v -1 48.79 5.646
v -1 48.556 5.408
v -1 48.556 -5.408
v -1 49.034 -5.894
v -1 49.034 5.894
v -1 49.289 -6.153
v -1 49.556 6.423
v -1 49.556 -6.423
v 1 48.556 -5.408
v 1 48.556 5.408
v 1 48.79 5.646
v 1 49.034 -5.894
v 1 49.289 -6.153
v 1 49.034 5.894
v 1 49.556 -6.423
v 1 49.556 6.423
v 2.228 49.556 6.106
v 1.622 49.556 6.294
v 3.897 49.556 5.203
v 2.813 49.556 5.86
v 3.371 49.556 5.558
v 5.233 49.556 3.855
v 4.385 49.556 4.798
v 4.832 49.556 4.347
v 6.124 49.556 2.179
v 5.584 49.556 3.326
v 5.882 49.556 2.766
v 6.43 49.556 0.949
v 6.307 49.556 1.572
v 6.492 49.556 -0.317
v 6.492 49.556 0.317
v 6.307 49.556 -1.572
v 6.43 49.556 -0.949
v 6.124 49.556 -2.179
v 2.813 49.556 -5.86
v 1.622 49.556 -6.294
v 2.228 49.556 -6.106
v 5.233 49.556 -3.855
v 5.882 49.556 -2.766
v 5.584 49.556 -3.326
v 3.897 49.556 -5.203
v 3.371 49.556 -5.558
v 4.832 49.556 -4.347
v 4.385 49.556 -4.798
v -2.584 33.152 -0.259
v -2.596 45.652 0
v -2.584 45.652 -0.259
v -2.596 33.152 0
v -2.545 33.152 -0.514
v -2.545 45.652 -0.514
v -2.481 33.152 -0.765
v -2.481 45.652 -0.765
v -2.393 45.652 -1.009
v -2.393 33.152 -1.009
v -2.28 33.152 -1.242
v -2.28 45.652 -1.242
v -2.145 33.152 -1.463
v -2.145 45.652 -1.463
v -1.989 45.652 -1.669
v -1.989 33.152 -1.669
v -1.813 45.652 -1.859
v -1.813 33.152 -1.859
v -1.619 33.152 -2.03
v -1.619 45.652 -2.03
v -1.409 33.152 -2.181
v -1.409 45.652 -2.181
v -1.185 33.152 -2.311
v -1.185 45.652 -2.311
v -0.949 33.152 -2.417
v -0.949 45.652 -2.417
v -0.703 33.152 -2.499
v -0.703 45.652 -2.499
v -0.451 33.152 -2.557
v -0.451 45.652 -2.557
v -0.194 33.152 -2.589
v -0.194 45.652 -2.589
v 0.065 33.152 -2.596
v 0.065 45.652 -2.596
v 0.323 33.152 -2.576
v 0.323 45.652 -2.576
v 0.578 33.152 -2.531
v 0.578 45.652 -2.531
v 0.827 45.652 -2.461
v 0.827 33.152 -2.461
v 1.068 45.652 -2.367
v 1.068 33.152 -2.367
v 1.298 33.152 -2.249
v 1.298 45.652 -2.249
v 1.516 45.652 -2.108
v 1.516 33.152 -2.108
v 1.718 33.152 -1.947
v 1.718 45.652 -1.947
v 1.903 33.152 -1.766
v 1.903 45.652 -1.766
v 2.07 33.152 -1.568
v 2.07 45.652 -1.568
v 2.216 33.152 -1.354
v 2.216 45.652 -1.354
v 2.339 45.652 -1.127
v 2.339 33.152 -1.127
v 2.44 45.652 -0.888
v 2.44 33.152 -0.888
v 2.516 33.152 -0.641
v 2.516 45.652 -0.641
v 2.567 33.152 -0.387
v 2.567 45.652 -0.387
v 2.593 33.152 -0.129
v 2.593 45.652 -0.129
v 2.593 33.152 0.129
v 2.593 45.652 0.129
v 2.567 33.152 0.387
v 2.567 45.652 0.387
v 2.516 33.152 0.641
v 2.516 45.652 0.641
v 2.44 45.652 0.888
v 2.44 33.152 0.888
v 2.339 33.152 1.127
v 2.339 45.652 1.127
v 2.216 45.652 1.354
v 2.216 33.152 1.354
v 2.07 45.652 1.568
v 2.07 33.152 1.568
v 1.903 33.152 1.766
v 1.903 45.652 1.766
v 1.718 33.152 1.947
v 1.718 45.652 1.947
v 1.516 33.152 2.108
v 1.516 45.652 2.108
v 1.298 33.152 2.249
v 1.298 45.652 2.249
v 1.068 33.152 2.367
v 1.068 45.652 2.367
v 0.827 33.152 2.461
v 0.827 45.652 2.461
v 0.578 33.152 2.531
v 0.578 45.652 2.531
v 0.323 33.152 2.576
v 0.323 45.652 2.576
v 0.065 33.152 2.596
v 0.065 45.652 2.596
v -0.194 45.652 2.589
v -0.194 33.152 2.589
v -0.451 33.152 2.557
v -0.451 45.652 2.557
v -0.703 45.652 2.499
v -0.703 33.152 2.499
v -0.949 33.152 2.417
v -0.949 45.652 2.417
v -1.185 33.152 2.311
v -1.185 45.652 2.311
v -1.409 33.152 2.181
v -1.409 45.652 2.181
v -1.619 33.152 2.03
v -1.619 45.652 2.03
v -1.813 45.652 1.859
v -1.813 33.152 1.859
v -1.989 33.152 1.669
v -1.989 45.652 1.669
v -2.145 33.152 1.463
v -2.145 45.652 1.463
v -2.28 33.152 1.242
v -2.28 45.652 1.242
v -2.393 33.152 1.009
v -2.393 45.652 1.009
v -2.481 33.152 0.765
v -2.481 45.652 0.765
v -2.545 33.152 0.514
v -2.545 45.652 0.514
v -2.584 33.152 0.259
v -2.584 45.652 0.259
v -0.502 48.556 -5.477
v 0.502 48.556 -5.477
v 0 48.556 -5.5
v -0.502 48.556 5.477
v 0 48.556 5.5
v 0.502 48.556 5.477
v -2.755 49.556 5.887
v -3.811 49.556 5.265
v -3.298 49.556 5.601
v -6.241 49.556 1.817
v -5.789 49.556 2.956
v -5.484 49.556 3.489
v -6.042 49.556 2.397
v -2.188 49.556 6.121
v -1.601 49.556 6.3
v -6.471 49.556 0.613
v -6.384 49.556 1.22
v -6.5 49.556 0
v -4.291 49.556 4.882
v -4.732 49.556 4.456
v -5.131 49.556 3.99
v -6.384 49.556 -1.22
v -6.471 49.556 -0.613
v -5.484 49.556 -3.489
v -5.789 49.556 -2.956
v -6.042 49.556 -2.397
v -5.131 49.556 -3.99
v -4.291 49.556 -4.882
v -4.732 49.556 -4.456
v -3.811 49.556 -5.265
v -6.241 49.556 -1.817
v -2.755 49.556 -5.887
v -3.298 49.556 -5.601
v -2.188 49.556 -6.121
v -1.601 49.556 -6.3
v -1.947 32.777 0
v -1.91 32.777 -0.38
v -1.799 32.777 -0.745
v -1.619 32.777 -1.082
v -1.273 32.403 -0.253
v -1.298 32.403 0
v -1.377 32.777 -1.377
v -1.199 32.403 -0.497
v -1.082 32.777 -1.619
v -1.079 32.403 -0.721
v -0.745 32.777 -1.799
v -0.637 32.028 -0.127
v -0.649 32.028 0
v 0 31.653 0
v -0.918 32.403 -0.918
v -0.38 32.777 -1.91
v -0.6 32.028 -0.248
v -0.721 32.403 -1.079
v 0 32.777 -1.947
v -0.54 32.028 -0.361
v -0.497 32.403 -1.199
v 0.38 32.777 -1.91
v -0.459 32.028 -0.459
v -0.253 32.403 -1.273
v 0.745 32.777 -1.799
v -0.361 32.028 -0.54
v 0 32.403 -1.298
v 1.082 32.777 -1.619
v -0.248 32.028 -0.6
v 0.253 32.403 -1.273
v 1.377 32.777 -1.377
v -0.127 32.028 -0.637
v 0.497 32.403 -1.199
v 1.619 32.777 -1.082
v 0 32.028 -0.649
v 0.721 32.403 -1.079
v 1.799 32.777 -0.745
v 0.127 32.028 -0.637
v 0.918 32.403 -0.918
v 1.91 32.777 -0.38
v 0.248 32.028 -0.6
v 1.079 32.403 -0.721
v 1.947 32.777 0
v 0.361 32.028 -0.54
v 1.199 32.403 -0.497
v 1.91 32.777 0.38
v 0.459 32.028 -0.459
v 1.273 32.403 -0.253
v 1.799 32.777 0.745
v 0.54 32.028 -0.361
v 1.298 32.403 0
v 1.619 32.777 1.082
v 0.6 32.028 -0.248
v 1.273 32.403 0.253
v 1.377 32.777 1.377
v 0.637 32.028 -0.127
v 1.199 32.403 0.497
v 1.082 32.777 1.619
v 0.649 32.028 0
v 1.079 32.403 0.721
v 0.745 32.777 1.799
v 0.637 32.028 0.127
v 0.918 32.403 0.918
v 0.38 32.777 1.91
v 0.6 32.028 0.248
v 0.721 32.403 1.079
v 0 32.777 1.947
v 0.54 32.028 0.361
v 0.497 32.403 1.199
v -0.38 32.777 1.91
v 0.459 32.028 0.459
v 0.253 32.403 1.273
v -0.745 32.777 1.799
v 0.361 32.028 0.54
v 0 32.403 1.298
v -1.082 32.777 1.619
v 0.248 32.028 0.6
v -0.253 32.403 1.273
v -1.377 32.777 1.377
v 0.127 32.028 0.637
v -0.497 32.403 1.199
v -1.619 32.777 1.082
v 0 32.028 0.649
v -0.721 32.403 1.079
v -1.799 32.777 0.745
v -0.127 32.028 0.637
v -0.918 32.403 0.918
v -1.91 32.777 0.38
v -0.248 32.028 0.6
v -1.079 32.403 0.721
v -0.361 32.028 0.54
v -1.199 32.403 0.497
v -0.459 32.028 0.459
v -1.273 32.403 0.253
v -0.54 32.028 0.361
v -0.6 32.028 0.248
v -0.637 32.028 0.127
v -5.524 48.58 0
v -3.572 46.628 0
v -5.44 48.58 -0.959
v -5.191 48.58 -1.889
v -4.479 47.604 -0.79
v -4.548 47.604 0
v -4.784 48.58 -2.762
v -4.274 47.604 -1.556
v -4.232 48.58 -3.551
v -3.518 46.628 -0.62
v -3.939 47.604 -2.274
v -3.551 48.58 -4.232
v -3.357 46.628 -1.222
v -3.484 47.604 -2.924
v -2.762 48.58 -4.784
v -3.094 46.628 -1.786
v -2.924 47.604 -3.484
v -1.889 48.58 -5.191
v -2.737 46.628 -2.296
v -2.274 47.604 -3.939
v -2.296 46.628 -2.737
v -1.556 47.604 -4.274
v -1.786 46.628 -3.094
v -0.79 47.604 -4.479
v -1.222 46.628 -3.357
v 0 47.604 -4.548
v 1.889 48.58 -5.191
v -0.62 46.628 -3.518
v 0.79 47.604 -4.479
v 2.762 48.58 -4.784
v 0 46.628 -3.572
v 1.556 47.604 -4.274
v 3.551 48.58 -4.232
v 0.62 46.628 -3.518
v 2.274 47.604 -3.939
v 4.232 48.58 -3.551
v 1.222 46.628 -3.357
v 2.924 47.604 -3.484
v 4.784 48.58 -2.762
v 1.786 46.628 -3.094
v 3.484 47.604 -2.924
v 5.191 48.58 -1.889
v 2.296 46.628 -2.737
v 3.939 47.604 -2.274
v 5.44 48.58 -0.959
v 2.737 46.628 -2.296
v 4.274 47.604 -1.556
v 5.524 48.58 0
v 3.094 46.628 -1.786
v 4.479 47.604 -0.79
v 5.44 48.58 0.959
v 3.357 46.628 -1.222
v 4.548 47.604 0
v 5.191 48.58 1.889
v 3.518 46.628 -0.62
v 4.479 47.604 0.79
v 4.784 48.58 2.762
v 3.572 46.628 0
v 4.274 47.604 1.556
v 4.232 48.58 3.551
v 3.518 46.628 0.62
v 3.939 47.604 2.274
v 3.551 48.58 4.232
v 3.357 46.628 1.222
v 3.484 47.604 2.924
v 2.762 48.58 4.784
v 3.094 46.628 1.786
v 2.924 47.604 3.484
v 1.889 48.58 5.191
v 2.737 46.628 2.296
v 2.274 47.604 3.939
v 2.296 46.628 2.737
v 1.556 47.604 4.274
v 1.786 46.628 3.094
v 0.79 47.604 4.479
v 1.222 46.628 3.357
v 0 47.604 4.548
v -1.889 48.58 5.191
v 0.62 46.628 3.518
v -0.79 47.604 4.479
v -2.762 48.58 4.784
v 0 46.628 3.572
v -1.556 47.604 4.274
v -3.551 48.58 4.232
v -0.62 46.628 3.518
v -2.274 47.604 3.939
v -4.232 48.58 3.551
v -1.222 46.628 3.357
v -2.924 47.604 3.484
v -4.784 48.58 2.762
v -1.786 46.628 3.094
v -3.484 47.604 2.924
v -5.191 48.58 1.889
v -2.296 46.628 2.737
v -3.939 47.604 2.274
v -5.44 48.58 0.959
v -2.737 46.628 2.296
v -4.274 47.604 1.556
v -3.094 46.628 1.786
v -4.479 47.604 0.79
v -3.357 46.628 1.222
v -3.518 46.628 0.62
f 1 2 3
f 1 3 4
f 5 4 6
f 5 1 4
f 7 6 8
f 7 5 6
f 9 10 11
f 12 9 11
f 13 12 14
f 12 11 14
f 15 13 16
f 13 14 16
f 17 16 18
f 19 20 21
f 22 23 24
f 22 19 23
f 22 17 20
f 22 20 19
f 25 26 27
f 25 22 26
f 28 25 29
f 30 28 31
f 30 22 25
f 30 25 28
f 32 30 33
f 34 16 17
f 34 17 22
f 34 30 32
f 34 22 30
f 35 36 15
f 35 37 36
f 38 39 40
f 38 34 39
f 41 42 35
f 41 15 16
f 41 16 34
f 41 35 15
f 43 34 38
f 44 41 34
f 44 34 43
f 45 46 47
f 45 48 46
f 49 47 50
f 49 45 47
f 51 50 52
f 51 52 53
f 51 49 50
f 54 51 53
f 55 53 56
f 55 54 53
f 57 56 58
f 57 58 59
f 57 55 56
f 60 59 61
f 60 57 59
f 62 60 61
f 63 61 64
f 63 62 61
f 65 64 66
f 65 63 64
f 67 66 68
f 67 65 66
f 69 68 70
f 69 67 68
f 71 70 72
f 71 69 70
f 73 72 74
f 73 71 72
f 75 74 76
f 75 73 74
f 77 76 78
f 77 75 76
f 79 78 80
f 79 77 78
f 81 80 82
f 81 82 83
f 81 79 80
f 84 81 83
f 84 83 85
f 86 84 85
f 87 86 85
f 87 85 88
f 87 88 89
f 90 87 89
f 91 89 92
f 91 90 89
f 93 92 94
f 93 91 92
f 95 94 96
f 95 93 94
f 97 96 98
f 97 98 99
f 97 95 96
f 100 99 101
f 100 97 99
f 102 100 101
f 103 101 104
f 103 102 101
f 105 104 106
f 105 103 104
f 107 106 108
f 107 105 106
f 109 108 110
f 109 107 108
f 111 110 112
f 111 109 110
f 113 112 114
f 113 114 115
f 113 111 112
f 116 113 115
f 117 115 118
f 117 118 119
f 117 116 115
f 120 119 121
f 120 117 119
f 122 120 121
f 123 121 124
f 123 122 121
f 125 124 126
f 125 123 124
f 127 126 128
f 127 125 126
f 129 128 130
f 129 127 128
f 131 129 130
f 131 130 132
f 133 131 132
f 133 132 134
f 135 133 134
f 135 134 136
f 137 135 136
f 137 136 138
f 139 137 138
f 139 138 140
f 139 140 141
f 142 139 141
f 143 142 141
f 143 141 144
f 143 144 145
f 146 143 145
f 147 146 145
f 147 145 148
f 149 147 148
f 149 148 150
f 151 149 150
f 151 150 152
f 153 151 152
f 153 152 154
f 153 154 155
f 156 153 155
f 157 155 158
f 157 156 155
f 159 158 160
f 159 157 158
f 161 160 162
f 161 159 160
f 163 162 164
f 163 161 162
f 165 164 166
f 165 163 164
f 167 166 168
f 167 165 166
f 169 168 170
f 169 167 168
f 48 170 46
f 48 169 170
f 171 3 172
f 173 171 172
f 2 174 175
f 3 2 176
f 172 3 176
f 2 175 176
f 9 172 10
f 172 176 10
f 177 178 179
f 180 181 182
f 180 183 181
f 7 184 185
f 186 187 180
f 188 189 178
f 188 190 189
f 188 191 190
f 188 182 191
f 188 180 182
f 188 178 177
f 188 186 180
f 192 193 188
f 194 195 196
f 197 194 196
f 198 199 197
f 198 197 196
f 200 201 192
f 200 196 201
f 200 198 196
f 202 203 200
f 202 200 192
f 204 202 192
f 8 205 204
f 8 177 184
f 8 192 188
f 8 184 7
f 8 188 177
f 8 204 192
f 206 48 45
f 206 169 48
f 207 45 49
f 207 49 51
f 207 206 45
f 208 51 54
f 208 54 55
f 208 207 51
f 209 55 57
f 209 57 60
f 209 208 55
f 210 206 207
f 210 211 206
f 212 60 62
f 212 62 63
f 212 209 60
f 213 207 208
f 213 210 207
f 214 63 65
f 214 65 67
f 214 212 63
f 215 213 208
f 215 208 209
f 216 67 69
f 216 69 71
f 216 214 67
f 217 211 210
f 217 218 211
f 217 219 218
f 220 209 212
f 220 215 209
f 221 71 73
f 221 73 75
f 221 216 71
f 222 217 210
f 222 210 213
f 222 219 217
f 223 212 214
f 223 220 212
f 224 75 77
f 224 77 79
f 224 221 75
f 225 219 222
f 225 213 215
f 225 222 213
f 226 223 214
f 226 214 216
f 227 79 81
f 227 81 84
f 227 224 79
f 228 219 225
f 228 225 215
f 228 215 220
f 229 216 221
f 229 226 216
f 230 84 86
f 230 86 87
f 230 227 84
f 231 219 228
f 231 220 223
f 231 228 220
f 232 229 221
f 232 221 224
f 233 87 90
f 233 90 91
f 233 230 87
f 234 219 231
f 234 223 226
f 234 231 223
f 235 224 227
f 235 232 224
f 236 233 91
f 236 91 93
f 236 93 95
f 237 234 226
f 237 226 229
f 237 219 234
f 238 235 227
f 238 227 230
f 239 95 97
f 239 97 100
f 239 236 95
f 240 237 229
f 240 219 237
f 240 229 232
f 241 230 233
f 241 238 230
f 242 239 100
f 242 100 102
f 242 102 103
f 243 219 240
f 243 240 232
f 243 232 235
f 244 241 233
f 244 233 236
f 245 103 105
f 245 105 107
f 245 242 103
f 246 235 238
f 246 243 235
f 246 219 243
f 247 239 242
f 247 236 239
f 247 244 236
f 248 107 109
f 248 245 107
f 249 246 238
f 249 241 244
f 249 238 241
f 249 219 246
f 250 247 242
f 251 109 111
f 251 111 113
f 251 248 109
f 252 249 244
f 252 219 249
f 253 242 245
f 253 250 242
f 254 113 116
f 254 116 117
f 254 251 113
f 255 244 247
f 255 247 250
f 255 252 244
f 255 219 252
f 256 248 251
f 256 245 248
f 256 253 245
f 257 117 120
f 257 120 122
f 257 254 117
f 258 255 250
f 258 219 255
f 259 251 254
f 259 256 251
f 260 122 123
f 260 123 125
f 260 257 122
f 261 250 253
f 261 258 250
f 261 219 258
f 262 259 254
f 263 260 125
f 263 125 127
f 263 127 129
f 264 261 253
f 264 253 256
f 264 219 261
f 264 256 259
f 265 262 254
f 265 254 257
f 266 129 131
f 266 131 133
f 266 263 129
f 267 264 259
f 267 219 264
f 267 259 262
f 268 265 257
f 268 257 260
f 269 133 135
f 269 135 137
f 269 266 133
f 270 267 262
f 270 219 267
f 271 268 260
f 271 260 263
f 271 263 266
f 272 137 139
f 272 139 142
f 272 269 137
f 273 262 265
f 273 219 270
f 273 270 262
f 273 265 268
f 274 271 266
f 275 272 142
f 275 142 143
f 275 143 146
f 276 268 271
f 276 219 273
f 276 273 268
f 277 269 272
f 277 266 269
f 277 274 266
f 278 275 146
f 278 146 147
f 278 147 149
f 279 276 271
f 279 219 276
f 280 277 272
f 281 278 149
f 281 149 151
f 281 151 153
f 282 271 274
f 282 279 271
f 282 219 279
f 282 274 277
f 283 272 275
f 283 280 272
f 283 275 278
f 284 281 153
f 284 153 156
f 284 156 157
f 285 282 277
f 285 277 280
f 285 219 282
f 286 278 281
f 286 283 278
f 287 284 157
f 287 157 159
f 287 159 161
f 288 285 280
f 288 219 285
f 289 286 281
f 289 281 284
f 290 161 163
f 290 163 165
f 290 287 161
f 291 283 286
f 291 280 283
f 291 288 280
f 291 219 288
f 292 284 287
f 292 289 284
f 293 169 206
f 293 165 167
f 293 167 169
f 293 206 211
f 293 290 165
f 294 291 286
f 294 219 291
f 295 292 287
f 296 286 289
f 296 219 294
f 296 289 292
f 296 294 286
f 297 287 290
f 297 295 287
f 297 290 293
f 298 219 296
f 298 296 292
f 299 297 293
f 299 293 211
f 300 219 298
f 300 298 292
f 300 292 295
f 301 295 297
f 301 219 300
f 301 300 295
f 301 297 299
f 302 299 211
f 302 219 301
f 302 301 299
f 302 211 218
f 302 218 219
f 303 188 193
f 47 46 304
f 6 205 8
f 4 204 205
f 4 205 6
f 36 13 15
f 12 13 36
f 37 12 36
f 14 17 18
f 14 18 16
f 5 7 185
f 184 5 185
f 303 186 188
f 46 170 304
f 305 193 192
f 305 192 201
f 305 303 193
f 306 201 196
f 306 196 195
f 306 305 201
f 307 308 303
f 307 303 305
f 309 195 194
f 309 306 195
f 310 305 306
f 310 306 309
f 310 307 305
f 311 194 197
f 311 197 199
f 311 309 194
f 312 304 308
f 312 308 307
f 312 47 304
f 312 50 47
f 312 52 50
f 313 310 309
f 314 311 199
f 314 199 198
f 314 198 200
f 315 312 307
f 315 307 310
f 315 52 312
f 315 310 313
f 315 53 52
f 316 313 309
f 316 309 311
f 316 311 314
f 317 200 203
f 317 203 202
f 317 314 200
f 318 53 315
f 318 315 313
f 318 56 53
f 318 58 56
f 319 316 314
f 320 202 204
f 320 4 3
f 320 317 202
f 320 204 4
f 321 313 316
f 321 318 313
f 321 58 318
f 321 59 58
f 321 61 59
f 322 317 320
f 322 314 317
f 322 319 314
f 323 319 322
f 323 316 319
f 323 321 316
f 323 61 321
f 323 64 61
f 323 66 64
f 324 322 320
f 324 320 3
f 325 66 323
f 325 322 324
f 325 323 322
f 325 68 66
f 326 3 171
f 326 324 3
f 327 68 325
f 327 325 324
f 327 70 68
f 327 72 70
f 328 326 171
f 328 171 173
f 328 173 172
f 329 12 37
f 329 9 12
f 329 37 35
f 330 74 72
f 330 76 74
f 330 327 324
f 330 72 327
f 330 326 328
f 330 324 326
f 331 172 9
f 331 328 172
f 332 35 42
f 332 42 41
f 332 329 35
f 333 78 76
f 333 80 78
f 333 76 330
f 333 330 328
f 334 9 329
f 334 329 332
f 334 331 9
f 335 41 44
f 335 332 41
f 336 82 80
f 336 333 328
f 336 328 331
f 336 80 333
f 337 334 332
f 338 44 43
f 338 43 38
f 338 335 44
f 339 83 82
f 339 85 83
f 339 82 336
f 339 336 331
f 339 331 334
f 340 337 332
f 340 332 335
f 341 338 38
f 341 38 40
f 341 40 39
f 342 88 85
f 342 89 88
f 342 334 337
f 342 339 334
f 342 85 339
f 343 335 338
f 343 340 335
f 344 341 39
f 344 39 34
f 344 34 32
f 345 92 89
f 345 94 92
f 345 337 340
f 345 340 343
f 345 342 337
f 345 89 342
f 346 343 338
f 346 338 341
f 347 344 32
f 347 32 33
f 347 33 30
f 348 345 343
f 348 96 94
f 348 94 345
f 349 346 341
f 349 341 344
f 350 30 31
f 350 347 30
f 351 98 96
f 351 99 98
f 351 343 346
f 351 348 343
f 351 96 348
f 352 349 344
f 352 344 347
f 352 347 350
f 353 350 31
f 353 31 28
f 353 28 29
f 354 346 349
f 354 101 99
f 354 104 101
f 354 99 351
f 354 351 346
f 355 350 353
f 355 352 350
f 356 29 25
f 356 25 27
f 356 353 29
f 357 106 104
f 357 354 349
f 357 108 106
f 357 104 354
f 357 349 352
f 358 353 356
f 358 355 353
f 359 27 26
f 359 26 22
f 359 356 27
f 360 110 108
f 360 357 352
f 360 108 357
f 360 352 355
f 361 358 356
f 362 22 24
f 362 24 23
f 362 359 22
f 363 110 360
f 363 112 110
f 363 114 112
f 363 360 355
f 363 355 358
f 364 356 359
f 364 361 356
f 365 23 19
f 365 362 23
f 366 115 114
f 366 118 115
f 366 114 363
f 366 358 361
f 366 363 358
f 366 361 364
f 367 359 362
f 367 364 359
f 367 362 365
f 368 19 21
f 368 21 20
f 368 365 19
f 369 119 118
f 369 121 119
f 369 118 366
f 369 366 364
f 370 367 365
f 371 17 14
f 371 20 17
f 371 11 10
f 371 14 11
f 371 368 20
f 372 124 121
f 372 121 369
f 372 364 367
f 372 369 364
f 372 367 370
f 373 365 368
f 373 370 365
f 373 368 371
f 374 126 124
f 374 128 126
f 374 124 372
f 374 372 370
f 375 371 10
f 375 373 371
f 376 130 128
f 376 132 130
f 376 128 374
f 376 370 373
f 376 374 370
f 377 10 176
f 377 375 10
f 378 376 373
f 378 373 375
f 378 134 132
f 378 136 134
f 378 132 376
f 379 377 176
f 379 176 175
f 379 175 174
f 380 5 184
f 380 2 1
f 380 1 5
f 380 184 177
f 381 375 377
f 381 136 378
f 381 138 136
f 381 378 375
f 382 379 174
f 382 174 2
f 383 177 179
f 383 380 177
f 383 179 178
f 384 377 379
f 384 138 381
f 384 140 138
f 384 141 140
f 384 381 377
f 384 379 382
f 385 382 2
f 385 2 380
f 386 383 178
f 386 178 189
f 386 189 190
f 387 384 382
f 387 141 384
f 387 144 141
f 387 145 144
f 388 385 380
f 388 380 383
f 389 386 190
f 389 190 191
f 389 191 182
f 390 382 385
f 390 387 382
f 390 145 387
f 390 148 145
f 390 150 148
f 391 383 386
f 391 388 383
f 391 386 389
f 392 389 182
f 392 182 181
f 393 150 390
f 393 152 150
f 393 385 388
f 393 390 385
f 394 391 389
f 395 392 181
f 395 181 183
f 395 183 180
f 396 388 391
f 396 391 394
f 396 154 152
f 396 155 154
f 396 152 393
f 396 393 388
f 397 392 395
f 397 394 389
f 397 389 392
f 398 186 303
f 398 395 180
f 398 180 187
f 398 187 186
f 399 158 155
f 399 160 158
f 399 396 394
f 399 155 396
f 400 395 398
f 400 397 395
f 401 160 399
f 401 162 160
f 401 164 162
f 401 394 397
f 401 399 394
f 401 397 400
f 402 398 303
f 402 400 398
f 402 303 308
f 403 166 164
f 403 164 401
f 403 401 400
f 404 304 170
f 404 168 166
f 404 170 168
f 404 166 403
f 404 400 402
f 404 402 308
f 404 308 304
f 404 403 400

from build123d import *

# Parameters (mm, degrees)
SKETCH2_W          = 2
SKETCH2_H          = 2
CUT_EXTRUDE1_DEPTH = 10


with BuildPart() as part:
    # Sketch1 → Revolve1 (revolve)
    with BuildSketch(Plane.XY, mode=Mode.PRIVATE) as revolve1_sk:
        Polygon((0, 49.555627393), (6.5, 49.555627393), (2.596444265, 45.652071659), (2.596444265, 33.152071659), (0, 31.653013863), align=None)
    revolve(revolve1_sk.sketch.rotate(Axis((0, 49.555627393, 0), (0, -1, 0)), 180), axis=Axis((0, 49.555627393, 0), (0, -1, 0)))

    # Sketch2 → Cut-Extrude1 (cut, symmetric)
    with BuildSketch(Plane.XY):
        with Locations((0, 49.555627393)):
            Rectangle(SKETCH2_W, SKETCH2_H)
    extrude(amount=CUT_EXTRUDE1_DEPTH, both=True, mode=Mode.SUBTRACT)


solid = part.part
